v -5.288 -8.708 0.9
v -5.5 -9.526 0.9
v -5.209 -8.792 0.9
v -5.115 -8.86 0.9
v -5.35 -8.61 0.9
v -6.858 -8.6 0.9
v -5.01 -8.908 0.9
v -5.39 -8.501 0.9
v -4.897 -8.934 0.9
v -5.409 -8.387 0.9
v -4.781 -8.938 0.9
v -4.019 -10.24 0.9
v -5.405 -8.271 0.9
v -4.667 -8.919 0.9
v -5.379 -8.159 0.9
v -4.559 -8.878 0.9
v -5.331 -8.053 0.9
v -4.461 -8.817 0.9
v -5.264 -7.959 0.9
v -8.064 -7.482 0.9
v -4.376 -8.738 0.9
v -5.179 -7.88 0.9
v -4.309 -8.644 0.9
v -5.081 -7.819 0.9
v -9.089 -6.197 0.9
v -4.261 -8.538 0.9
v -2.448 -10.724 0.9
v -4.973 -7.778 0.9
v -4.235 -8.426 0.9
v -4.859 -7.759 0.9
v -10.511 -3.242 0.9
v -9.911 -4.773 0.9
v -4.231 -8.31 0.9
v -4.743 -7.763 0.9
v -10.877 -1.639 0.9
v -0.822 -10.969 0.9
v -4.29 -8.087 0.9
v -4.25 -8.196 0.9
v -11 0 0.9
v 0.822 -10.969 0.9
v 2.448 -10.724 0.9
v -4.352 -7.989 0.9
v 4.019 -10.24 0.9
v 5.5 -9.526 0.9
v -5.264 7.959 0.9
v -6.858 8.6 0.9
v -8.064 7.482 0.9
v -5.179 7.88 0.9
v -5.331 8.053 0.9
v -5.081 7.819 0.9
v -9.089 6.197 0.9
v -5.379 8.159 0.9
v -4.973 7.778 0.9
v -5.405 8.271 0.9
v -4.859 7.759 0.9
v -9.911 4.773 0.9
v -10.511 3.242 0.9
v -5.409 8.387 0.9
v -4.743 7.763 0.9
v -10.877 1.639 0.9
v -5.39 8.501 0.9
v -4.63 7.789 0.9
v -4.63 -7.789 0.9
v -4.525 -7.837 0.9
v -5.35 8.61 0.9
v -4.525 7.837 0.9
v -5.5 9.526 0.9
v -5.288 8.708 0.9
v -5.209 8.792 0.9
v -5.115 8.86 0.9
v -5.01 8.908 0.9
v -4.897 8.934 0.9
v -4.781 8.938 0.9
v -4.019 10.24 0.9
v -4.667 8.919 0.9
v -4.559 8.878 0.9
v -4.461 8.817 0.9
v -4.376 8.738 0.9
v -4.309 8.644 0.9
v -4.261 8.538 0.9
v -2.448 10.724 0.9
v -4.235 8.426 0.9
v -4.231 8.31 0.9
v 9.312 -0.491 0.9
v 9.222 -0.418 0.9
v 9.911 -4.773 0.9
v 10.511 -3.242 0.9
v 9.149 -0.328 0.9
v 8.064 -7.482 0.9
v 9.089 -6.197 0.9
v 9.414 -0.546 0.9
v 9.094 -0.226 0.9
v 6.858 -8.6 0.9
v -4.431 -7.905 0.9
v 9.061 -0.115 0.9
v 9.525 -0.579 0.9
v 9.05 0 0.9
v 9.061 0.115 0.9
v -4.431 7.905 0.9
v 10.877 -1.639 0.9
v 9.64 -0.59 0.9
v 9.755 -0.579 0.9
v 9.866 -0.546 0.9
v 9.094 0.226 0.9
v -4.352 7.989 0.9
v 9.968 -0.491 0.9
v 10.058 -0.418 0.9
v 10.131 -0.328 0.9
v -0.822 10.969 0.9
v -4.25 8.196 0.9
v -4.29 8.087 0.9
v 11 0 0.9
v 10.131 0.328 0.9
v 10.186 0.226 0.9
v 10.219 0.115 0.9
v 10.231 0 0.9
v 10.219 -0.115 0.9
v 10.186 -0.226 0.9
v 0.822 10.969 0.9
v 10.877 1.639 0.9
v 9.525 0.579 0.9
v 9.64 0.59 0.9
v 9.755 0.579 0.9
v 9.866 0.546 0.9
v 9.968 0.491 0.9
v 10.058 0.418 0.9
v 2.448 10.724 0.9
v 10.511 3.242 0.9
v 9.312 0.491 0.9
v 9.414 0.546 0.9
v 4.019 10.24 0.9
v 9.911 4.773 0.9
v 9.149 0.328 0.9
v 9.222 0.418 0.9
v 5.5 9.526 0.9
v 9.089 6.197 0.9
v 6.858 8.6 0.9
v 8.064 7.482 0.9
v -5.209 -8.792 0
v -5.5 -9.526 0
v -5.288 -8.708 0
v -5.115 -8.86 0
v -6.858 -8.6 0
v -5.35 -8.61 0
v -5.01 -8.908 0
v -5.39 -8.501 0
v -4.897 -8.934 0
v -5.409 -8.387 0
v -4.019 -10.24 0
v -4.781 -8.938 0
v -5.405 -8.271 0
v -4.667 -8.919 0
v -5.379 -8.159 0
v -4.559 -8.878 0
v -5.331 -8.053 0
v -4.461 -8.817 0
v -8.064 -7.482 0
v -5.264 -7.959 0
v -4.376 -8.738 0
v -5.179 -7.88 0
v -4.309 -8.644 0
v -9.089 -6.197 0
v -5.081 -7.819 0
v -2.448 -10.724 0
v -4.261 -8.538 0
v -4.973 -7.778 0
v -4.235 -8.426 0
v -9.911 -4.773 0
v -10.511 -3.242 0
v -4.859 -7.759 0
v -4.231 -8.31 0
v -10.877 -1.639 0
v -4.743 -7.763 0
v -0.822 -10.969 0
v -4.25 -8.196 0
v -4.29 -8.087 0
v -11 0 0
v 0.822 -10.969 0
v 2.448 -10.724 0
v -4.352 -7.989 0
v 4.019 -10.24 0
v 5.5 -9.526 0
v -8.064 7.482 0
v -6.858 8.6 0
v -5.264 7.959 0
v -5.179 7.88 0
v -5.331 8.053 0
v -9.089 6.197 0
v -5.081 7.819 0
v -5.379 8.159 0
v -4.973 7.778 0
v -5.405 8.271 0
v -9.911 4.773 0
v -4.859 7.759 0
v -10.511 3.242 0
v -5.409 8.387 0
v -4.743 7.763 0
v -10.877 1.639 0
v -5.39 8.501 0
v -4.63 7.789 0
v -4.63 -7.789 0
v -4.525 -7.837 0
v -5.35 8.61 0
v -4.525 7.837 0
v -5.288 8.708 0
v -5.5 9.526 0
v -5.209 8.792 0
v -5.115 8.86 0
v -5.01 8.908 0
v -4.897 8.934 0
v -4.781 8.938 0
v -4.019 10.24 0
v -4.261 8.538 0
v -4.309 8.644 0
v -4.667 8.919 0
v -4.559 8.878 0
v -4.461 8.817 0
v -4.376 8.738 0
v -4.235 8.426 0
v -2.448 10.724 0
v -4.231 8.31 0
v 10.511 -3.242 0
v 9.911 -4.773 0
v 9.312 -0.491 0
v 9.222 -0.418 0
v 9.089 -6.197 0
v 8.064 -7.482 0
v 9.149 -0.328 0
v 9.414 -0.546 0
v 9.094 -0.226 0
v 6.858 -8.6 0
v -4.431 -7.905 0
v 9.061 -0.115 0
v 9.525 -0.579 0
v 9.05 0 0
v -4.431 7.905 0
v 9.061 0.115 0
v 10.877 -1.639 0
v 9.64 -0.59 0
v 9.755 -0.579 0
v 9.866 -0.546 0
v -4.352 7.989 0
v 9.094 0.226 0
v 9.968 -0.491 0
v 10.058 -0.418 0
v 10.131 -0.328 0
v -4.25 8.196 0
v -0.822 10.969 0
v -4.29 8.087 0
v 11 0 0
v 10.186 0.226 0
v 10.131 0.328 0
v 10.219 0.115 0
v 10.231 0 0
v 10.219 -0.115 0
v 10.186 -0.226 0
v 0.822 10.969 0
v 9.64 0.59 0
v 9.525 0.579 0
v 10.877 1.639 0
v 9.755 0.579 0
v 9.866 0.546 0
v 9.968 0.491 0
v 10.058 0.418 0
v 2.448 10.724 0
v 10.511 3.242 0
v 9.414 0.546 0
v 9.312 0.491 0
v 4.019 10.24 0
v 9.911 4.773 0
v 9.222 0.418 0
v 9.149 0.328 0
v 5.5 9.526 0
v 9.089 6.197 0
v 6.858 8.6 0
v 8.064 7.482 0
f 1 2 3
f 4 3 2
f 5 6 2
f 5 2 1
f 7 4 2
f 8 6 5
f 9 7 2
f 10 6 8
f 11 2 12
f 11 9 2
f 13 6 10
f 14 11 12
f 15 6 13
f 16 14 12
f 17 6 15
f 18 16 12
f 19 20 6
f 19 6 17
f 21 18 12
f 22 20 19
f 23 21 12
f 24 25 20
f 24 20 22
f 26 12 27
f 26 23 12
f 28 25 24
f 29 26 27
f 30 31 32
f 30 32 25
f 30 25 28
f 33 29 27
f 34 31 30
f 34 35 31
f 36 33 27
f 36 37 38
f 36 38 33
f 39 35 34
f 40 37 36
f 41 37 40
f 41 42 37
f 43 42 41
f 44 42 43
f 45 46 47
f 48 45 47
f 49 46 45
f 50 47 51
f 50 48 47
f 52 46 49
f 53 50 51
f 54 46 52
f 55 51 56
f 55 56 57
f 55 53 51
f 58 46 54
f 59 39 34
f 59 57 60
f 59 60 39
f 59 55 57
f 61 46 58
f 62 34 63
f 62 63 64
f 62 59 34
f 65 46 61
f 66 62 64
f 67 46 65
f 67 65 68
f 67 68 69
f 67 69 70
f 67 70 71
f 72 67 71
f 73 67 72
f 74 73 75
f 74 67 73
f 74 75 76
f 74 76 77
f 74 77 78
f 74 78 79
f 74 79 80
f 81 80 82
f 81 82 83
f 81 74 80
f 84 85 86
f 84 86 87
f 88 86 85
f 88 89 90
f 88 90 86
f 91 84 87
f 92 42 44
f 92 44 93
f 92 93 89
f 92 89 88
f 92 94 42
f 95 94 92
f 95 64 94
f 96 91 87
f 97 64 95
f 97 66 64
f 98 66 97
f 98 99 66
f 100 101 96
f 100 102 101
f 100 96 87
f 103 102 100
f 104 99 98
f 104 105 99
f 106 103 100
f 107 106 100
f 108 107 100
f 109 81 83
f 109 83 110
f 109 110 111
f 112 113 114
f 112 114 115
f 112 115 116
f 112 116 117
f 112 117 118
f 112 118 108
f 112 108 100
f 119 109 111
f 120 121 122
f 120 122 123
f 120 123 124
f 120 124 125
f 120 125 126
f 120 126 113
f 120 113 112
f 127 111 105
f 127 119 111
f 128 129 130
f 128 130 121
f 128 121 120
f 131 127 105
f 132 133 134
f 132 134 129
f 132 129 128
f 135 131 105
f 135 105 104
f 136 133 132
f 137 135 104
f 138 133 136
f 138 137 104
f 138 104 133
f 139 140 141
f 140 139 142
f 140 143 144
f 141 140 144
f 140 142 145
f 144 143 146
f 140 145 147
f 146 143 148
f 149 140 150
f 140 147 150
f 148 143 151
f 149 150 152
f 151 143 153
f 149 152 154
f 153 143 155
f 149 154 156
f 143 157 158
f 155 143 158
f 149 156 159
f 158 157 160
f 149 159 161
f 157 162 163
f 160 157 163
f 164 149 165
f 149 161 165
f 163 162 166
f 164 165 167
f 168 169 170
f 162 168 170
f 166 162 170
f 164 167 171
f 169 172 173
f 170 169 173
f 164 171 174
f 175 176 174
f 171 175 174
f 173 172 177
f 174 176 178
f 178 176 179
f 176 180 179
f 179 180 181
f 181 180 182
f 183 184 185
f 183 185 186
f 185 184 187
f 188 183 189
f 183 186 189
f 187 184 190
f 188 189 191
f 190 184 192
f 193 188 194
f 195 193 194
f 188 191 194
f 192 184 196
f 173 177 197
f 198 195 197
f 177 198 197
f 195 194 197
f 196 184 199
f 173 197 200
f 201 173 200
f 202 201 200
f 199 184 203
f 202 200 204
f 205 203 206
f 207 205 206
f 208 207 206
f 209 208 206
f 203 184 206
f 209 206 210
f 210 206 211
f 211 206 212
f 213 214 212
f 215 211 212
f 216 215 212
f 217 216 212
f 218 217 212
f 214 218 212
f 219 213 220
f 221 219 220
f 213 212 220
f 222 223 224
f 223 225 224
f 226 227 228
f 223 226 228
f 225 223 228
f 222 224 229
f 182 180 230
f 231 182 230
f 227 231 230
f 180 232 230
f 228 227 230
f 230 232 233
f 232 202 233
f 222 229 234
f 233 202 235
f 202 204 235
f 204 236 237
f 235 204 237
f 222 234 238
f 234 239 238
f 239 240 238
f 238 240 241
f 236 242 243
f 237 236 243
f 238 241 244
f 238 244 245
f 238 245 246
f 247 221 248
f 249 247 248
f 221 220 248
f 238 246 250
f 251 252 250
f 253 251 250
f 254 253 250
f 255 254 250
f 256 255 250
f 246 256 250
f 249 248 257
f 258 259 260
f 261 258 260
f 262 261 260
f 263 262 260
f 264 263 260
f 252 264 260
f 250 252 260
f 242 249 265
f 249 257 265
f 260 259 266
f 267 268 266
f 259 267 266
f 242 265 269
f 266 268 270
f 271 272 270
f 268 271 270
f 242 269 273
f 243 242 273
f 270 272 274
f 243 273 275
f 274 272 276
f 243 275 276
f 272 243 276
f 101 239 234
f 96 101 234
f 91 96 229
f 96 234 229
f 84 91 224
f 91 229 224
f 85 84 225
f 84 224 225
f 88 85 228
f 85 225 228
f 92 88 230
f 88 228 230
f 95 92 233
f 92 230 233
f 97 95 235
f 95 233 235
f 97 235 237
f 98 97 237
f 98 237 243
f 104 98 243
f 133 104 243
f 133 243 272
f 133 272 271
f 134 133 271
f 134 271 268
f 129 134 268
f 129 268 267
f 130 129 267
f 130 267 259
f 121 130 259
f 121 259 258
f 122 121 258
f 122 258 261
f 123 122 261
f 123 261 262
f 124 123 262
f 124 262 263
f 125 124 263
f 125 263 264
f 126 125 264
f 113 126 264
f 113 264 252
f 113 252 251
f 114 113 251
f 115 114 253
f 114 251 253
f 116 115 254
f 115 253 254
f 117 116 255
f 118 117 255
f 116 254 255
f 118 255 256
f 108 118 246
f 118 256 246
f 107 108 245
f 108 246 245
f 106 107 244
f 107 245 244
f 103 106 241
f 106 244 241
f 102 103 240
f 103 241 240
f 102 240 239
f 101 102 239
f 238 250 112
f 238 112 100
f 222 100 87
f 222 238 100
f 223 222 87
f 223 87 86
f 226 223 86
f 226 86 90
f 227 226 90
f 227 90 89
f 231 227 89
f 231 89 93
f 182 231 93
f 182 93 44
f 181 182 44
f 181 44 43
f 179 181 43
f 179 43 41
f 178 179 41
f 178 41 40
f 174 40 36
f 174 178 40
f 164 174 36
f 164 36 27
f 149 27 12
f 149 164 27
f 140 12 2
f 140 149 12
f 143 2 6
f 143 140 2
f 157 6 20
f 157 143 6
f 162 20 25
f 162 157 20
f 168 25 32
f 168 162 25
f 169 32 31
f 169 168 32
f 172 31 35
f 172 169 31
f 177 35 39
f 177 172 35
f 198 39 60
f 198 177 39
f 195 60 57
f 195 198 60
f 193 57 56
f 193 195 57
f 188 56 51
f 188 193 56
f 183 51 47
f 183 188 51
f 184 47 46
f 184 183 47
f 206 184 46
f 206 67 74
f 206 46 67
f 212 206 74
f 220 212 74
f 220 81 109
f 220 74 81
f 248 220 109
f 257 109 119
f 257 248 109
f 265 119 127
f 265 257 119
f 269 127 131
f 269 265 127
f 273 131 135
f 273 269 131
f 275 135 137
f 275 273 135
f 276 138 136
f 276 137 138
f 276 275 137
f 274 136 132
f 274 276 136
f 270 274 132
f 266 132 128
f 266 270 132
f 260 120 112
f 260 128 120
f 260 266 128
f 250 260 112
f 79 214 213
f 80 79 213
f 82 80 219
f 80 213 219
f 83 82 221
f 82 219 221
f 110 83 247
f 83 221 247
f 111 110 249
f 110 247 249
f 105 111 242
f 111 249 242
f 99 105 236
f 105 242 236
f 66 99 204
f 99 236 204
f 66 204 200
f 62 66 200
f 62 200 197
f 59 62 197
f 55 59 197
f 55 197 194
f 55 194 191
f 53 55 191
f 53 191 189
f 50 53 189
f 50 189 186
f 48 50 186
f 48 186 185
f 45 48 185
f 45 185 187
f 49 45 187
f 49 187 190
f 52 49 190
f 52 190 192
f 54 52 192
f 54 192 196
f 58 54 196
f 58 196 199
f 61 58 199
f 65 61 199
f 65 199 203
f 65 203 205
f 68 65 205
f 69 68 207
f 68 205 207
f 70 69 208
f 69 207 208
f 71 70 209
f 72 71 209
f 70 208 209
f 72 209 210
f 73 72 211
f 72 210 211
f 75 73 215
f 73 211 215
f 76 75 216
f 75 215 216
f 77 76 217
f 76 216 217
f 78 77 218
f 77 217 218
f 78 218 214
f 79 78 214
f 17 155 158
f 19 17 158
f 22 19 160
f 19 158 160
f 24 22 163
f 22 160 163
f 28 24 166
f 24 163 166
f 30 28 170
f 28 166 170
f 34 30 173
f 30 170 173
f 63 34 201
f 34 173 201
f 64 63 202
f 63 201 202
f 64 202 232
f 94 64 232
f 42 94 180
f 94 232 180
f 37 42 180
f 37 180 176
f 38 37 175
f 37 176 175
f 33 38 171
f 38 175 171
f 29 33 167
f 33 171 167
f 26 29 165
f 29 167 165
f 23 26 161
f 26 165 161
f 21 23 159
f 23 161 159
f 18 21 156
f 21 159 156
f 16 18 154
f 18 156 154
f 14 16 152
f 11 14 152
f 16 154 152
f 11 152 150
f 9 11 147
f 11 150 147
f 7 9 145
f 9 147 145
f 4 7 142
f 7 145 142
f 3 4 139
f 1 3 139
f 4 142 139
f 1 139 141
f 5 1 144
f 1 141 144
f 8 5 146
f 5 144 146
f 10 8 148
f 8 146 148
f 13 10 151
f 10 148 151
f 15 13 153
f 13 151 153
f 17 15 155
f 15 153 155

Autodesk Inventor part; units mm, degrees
ref_plane "YZ Plane" through (0, 0, 0) normal (1, 0, 0) x (0, 1, 0)
ref_plane "XZ Plane" through (0, 0, 0) normal (0, 1, 0) x (-1, 0, 0)
ref_plane "XY Plane" through (0, 0, 0) normal (0, 0, 1) x (1, 0, 0)
sketch "Sketch1" plane through (0, 0, 0) normal (0, 0, 1) x (1, 0, 0)
  circle A0 centre (0, 0) radius 11
  dimension "d0" = 22
extrude "Extrusion1" add sketch "Sketch1" along normal blind 0.9
sketch "Sketch2" plane through (0, 0, 0.9) normal (0, 0, 1) x (1, 0, 0)
  circle A0 centre (0, 0) radius 11 projected
  point P0 (9.64, 0)
  dimension "d3" = 9.64
hole "Hole1" at (9.64, 0, 0.9) direction (0, 0, -1) diameter 1.181 depth 8 thread size "0-80 UNF" class "2B" standard "ANSI Unified Screw Threads"
pattern_circular "Circular Pattern1" count 3 over 360 about axis through (0, 0, -10) along (0, 0, 1) of "Hole1"
properties part number "PCB"
